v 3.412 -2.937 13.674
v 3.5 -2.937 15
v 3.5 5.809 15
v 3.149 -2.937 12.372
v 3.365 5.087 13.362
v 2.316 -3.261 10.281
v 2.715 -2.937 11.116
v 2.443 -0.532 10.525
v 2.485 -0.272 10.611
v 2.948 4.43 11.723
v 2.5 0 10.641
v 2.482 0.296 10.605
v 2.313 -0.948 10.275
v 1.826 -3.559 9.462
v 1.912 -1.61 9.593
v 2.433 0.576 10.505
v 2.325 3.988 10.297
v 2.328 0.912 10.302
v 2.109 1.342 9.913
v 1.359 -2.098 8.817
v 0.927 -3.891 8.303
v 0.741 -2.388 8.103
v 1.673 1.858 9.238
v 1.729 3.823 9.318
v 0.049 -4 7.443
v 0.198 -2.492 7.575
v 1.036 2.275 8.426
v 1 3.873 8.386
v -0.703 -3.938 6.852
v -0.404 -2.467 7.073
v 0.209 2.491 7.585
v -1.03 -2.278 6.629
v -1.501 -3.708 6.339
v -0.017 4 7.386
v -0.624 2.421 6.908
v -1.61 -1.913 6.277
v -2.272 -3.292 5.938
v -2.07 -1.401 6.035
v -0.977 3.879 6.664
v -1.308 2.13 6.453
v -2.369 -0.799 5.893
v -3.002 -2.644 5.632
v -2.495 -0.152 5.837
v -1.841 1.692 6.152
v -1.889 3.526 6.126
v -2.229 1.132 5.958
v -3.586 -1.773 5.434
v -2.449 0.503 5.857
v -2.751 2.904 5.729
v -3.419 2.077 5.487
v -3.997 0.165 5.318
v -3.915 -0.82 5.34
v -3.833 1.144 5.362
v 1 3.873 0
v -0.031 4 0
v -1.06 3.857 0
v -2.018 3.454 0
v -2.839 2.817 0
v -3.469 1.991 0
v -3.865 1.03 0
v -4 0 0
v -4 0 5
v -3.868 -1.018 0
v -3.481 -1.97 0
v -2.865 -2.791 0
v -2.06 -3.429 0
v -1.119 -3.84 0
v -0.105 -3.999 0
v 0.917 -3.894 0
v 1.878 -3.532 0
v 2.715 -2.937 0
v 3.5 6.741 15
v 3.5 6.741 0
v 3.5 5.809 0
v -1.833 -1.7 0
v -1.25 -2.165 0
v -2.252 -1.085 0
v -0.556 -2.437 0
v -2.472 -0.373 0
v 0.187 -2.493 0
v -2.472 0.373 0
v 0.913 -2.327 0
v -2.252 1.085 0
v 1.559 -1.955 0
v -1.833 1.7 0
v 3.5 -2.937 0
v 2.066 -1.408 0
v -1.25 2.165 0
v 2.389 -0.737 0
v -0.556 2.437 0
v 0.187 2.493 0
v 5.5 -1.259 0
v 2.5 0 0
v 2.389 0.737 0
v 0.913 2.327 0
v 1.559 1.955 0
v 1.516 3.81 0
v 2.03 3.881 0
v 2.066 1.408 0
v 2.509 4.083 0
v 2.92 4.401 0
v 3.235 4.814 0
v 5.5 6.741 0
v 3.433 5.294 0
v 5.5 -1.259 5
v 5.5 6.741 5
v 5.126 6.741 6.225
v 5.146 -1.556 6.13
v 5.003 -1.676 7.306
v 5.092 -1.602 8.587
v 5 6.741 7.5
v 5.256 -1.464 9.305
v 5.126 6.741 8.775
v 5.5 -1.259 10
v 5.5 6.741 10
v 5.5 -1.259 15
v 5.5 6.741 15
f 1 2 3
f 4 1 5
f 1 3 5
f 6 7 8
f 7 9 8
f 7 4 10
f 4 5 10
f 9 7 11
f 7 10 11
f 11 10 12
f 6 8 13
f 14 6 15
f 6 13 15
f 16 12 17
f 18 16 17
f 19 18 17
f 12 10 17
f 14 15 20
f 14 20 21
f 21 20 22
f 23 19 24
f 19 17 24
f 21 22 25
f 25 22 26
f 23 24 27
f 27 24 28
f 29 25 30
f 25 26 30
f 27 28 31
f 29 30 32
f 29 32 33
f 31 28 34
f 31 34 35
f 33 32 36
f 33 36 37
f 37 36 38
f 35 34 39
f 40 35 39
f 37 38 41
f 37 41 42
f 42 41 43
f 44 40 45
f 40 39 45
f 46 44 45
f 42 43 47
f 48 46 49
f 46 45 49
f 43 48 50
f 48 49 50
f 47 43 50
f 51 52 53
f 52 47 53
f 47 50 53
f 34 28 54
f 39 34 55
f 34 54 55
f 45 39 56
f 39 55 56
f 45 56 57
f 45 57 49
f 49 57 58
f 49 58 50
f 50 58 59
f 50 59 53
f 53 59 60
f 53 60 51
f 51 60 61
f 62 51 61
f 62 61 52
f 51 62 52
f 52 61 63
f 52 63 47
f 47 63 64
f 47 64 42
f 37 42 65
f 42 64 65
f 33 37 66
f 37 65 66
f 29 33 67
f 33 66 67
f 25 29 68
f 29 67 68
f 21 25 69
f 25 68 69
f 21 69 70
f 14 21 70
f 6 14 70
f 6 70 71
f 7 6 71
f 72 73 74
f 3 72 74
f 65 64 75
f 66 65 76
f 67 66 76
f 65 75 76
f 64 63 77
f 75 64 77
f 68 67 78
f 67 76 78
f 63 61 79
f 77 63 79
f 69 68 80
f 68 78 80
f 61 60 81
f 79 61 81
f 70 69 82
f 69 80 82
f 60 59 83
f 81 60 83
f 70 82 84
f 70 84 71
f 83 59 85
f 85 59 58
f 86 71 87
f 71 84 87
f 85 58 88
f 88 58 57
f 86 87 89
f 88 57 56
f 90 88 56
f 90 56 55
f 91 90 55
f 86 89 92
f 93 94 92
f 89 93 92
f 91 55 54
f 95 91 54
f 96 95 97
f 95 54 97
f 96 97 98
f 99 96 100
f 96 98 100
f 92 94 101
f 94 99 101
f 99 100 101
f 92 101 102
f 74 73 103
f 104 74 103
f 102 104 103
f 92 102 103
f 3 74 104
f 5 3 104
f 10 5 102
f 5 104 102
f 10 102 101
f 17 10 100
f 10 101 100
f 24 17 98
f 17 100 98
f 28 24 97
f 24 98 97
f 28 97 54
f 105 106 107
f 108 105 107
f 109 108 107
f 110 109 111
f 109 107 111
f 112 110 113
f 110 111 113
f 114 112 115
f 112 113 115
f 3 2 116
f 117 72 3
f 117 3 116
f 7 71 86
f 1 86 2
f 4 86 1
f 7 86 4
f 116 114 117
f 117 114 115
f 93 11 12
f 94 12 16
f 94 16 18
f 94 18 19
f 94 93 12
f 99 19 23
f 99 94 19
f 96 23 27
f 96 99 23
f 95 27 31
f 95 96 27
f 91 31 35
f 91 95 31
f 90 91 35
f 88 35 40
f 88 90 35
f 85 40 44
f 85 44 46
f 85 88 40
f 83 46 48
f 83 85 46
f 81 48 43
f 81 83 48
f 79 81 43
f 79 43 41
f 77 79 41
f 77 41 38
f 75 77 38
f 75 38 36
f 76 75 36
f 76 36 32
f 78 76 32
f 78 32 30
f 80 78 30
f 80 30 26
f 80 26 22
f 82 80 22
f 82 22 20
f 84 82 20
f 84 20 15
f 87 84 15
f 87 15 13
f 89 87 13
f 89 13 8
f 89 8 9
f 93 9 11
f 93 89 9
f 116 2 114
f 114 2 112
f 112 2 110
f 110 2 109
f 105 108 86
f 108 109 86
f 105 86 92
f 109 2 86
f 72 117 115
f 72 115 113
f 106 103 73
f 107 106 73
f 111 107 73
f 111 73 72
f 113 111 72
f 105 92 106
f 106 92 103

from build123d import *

# Parameters (mm, degrees)
SKETCH_1_R          = 2.5
EXTRUDE_1_DEPTH     = 15
SKETCH_2_OUTSIDE_W  = 15.65
SKETCH_2_OUTSIDE_H  = 21.15
CUT_EXTRUDE_1_DEPTH = 11.740715169


with BuildPart() as part:
    # 草圖1 → 填料-伸長1 (new body)
    with BuildSketch(Plane.XY):
        with BuildLine():
            Line((3.5, -2.937484093), (5.5, -1.259284831))
            Line((5.5, -1.259284831), (5.5, 6.740715169))
            Line((5.5, 6.740715169), (3.5, 6.740715169))
            Line((3.5, 6.740715169), (3.5, 5.809475019))
            ThreePointArc((3.5, 5.809475019), (2.724744871, 4.228336189), (1, 3.872983346))
            ThreePointArc((1, 3.872983346), (-3.878905774, -0.976775304), (2.714993039, -2.937484093))
            Line((2.714993039, -2.937484093), (3.5, -2.937484093))
        make_face()
        Circle(SKETCH_1_R, mode=Mode.SUBTRACT)
    extrude(amount=EXTRUDE_1_DEPTH)

    # 草圖2 outside → 除料-伸長1 (cut, through all)
    with BuildSketch(Plane(origin=(0, 6.740715169, 0), x_dir=(1, 0, 0), z_dir=(0, 1, 0))):
        with Locations((0.75, -7.5)):
            Rectangle(SKETCH_2_OUTSIDE_W, SKETCH_2_OUTSIDE_H)
        with BuildLine():
            Line((5.5, -15), (3.5, -15))
            ThreePointArc((3.5, -15), (0.571067812, -7.928932188), (-6.5, -5))
            Line((-6.5, -5), (-4, -5))
            Line((-4, -5), (-4, 0))
            Line((-4, 0), (5.5, 0))
            Line((5.5, 0), (5.5, -5))
            ThreePointArc((5.5, -5), (5, -7.5), (5.5, -10))
            Line((5.5, -10), (5.5, -15))
        make_face(mode=Mode.SUBTRACT)
    extrude(amount=-CUT_EXTRUDE_1_DEPTH, mode=Mode.SUBTRACT)


solid = part.part
